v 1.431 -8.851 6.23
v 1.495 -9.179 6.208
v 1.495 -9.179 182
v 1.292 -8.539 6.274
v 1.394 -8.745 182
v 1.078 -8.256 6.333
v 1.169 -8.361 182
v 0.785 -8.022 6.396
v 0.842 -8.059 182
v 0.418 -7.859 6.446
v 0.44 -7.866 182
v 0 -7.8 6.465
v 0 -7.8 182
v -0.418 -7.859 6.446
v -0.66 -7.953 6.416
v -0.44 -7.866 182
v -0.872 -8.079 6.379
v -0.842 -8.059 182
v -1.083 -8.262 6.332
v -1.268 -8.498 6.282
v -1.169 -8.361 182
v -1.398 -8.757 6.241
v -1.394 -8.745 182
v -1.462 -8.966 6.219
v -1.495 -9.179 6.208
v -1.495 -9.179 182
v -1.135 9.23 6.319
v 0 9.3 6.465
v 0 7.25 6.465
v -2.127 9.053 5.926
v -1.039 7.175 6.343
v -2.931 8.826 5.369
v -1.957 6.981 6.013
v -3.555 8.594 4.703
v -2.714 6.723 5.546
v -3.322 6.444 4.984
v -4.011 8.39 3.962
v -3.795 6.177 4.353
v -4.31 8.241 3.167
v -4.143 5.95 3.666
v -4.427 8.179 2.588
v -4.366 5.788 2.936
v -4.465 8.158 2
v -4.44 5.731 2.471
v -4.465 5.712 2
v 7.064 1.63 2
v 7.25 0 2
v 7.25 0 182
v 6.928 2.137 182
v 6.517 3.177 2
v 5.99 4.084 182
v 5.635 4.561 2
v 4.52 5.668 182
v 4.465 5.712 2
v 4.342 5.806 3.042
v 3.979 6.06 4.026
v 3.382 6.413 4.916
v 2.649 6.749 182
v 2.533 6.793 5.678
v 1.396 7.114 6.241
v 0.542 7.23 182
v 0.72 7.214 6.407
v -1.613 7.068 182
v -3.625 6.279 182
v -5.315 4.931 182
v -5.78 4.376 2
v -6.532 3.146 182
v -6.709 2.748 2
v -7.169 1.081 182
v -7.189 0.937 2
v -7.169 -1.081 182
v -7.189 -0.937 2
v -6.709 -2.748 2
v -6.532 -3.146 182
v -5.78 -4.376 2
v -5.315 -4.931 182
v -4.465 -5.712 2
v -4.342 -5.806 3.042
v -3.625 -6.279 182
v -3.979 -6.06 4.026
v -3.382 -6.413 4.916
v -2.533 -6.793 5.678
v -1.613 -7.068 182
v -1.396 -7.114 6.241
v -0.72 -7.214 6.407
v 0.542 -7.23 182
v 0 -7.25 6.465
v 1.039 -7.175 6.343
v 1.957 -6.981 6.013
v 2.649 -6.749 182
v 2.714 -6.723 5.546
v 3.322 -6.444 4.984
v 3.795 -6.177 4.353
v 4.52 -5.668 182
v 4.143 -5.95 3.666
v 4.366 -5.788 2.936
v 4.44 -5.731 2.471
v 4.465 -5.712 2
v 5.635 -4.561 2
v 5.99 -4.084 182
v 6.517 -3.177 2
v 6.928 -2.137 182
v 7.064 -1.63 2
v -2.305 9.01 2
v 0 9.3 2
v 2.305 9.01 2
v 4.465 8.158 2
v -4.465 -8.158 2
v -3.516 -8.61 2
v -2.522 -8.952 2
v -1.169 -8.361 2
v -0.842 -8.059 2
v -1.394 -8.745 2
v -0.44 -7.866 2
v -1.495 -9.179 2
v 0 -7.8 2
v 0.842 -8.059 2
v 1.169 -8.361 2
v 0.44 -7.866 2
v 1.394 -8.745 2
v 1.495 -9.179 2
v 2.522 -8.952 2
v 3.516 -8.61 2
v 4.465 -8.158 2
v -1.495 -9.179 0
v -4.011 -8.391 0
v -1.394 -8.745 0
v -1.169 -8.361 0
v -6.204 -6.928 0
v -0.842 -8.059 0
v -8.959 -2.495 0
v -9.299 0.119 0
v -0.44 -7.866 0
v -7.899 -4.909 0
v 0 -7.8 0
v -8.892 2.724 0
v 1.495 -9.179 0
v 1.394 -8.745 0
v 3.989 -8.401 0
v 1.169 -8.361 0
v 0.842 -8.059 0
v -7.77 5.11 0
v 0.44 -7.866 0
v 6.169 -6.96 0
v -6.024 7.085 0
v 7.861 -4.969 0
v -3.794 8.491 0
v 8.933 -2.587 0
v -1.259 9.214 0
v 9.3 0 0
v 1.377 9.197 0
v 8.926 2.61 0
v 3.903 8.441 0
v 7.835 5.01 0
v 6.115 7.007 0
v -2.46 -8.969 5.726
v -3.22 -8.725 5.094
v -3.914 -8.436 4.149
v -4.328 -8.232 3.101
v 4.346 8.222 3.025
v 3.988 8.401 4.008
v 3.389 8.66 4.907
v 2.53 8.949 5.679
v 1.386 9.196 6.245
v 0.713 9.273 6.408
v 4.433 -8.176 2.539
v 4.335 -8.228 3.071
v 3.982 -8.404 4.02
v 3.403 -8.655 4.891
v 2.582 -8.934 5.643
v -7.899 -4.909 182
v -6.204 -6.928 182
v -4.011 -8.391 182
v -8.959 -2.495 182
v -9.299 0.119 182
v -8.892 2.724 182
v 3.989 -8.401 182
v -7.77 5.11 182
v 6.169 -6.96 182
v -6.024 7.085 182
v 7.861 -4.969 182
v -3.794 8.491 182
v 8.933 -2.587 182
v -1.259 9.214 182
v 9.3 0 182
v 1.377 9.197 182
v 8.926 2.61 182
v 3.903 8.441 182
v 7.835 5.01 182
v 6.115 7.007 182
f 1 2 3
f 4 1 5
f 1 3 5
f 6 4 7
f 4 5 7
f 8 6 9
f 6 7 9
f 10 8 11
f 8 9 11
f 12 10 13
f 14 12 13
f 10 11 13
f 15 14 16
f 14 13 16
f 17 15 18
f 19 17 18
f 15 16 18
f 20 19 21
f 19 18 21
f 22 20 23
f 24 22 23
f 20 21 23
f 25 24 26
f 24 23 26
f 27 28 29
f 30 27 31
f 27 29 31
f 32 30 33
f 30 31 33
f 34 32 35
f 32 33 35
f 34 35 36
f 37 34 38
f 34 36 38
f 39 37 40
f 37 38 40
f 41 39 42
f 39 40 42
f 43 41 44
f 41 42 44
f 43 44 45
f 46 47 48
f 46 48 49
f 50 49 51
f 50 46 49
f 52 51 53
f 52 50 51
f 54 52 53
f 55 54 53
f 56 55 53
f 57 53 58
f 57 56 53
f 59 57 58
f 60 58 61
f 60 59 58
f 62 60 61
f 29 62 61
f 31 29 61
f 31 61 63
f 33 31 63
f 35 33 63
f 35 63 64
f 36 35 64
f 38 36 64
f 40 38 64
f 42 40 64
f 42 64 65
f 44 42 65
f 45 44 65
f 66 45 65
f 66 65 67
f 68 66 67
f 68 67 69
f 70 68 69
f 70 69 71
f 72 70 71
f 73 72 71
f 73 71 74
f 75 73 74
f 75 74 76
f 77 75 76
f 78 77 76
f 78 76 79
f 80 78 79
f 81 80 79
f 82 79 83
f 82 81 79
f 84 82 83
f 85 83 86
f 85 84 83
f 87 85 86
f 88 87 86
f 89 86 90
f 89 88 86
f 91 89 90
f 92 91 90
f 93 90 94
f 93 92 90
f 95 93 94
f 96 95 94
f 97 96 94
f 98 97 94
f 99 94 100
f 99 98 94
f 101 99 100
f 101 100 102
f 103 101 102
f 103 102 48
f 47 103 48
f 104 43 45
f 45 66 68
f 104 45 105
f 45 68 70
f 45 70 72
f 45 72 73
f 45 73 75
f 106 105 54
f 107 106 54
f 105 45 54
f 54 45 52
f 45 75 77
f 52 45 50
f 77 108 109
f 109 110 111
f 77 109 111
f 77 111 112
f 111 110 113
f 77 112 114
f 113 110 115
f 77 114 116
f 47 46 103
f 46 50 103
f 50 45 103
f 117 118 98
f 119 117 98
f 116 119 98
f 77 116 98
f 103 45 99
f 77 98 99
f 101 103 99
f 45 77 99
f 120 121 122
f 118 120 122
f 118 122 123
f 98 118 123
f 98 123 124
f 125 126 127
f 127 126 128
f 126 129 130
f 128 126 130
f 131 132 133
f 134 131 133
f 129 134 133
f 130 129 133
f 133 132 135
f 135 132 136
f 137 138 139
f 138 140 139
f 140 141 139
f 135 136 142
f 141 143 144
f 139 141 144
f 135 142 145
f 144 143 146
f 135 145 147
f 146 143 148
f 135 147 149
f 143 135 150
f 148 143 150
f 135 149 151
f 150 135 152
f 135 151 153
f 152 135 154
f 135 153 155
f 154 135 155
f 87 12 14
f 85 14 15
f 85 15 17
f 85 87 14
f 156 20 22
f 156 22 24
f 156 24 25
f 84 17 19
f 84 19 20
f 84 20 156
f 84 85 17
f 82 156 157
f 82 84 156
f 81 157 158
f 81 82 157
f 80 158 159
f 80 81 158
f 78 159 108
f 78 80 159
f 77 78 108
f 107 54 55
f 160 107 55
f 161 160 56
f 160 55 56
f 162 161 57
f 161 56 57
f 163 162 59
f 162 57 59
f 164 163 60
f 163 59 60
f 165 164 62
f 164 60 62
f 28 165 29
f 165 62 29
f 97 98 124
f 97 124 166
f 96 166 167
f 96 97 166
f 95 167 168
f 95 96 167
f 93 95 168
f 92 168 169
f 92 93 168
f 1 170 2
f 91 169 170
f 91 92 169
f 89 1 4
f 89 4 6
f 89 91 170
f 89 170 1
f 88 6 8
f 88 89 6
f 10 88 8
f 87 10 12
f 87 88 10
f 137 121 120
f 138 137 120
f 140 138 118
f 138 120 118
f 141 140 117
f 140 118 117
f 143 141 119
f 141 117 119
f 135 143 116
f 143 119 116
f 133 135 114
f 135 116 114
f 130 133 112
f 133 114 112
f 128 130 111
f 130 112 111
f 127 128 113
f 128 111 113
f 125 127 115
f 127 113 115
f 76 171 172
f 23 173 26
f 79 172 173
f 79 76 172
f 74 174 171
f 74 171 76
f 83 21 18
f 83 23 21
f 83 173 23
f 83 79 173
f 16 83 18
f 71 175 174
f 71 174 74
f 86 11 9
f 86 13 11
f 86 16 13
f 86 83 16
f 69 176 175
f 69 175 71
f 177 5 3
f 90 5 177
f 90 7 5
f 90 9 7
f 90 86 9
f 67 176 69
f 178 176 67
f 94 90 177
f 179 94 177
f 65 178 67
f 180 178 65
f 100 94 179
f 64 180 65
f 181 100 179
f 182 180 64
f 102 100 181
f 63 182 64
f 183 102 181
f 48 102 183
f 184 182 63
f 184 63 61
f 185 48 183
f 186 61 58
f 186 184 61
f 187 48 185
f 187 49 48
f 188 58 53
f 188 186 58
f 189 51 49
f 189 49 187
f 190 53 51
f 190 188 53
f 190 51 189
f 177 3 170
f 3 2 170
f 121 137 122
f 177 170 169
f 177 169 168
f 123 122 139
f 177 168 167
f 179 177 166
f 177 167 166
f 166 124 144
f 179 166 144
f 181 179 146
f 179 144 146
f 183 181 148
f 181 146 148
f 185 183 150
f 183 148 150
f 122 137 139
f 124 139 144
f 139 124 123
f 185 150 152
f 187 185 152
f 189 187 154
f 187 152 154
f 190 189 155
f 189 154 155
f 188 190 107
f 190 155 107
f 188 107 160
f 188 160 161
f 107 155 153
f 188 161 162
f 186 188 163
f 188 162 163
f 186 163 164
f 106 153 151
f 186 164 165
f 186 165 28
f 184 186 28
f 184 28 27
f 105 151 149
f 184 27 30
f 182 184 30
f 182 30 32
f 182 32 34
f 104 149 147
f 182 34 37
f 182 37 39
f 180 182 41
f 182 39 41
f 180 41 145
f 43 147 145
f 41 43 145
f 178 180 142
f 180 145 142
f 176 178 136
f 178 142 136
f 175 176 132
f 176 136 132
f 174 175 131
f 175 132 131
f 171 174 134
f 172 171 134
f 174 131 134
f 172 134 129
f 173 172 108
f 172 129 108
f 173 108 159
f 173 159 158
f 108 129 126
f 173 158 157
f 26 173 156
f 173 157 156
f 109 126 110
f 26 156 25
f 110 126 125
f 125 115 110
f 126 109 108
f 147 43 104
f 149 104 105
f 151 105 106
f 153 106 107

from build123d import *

# Parameters (mm, degrees)
F0_R     = 9.3
F1_DEPTH = 2
F2_R     = 9.3
F2_R_2   = 7.25
F3_DEPTH = 180
F5_DEPTH = 9.301
F6_DEPTH = 9.3010001
F8_DEPTH = 182.0010001


with BuildPart() as f1:
    # F0 (on Top) → F1 (new body)
    with BuildSketch(Plane.XY):
        Circle(F0_R)
    extrude(amount=F1_DEPTH)

    # F2 (on face) → F3 (join)
    with BuildSketch(Plane.XY.offset(2)):
        Circle(F2_R)
        Circle(F2_R_2, mode=Mode.SUBTRACT)
    extrude(amount=F3_DEPTH)

    # F4 (on Front) → F5 (cut, through all)
    with BuildSketch(Plane.XZ):
        with BuildLine():
            ThreePointArc((0, 6.4653703012), (-3.1574936205, 5.1574936205), (-4.4653703012, 2))
            Line((-4.4653703012, 2), (4.4653703012, 2))
            ThreePointArc((4.4653703012, 2), (3.1574936205, 5.1574936205), (0, 6.4653703012))
        make_face()
    extrude(amount=-F5_DEPTH, mode=Mode.SUBTRACT)

    # F4 (on Front) → F6 (cut, through all)
    with BuildSketch(Plane.XZ):
        with BuildLine():
            ThreePointArc((0, 6.4653703012), (-3.1574936205, 5.1574936205), (-4.4653703012, 2))
            Line((-4.4653703012, 2), (4.4653703012, 2))
            ThreePointArc((4.4653703012, 2), (3.1574936205, 5.1574936205), (0, 6.4653703012))
        make_face()
    extrude(amount=F6_DEPTH, mode=Mode.SUBTRACT)

    # F7 (on face) → F8 (cut, through all)
    with BuildSketch(Plane.XY.offset(182)):
        with BuildLine():
            ThreePointArc((-1.4951143118, -9.1790322581), (0, -9.3), (1.4951143118, -9.1790322581))
            ThreePointArc((1.4951143118, -9.1790322581), (0, -7.8), (-1.4951143118, -9.1790322581))
        make_face()
    extrude(amount=-F8_DEPTH, mode=Mode.SUBTRACT)


solid = f1.part
